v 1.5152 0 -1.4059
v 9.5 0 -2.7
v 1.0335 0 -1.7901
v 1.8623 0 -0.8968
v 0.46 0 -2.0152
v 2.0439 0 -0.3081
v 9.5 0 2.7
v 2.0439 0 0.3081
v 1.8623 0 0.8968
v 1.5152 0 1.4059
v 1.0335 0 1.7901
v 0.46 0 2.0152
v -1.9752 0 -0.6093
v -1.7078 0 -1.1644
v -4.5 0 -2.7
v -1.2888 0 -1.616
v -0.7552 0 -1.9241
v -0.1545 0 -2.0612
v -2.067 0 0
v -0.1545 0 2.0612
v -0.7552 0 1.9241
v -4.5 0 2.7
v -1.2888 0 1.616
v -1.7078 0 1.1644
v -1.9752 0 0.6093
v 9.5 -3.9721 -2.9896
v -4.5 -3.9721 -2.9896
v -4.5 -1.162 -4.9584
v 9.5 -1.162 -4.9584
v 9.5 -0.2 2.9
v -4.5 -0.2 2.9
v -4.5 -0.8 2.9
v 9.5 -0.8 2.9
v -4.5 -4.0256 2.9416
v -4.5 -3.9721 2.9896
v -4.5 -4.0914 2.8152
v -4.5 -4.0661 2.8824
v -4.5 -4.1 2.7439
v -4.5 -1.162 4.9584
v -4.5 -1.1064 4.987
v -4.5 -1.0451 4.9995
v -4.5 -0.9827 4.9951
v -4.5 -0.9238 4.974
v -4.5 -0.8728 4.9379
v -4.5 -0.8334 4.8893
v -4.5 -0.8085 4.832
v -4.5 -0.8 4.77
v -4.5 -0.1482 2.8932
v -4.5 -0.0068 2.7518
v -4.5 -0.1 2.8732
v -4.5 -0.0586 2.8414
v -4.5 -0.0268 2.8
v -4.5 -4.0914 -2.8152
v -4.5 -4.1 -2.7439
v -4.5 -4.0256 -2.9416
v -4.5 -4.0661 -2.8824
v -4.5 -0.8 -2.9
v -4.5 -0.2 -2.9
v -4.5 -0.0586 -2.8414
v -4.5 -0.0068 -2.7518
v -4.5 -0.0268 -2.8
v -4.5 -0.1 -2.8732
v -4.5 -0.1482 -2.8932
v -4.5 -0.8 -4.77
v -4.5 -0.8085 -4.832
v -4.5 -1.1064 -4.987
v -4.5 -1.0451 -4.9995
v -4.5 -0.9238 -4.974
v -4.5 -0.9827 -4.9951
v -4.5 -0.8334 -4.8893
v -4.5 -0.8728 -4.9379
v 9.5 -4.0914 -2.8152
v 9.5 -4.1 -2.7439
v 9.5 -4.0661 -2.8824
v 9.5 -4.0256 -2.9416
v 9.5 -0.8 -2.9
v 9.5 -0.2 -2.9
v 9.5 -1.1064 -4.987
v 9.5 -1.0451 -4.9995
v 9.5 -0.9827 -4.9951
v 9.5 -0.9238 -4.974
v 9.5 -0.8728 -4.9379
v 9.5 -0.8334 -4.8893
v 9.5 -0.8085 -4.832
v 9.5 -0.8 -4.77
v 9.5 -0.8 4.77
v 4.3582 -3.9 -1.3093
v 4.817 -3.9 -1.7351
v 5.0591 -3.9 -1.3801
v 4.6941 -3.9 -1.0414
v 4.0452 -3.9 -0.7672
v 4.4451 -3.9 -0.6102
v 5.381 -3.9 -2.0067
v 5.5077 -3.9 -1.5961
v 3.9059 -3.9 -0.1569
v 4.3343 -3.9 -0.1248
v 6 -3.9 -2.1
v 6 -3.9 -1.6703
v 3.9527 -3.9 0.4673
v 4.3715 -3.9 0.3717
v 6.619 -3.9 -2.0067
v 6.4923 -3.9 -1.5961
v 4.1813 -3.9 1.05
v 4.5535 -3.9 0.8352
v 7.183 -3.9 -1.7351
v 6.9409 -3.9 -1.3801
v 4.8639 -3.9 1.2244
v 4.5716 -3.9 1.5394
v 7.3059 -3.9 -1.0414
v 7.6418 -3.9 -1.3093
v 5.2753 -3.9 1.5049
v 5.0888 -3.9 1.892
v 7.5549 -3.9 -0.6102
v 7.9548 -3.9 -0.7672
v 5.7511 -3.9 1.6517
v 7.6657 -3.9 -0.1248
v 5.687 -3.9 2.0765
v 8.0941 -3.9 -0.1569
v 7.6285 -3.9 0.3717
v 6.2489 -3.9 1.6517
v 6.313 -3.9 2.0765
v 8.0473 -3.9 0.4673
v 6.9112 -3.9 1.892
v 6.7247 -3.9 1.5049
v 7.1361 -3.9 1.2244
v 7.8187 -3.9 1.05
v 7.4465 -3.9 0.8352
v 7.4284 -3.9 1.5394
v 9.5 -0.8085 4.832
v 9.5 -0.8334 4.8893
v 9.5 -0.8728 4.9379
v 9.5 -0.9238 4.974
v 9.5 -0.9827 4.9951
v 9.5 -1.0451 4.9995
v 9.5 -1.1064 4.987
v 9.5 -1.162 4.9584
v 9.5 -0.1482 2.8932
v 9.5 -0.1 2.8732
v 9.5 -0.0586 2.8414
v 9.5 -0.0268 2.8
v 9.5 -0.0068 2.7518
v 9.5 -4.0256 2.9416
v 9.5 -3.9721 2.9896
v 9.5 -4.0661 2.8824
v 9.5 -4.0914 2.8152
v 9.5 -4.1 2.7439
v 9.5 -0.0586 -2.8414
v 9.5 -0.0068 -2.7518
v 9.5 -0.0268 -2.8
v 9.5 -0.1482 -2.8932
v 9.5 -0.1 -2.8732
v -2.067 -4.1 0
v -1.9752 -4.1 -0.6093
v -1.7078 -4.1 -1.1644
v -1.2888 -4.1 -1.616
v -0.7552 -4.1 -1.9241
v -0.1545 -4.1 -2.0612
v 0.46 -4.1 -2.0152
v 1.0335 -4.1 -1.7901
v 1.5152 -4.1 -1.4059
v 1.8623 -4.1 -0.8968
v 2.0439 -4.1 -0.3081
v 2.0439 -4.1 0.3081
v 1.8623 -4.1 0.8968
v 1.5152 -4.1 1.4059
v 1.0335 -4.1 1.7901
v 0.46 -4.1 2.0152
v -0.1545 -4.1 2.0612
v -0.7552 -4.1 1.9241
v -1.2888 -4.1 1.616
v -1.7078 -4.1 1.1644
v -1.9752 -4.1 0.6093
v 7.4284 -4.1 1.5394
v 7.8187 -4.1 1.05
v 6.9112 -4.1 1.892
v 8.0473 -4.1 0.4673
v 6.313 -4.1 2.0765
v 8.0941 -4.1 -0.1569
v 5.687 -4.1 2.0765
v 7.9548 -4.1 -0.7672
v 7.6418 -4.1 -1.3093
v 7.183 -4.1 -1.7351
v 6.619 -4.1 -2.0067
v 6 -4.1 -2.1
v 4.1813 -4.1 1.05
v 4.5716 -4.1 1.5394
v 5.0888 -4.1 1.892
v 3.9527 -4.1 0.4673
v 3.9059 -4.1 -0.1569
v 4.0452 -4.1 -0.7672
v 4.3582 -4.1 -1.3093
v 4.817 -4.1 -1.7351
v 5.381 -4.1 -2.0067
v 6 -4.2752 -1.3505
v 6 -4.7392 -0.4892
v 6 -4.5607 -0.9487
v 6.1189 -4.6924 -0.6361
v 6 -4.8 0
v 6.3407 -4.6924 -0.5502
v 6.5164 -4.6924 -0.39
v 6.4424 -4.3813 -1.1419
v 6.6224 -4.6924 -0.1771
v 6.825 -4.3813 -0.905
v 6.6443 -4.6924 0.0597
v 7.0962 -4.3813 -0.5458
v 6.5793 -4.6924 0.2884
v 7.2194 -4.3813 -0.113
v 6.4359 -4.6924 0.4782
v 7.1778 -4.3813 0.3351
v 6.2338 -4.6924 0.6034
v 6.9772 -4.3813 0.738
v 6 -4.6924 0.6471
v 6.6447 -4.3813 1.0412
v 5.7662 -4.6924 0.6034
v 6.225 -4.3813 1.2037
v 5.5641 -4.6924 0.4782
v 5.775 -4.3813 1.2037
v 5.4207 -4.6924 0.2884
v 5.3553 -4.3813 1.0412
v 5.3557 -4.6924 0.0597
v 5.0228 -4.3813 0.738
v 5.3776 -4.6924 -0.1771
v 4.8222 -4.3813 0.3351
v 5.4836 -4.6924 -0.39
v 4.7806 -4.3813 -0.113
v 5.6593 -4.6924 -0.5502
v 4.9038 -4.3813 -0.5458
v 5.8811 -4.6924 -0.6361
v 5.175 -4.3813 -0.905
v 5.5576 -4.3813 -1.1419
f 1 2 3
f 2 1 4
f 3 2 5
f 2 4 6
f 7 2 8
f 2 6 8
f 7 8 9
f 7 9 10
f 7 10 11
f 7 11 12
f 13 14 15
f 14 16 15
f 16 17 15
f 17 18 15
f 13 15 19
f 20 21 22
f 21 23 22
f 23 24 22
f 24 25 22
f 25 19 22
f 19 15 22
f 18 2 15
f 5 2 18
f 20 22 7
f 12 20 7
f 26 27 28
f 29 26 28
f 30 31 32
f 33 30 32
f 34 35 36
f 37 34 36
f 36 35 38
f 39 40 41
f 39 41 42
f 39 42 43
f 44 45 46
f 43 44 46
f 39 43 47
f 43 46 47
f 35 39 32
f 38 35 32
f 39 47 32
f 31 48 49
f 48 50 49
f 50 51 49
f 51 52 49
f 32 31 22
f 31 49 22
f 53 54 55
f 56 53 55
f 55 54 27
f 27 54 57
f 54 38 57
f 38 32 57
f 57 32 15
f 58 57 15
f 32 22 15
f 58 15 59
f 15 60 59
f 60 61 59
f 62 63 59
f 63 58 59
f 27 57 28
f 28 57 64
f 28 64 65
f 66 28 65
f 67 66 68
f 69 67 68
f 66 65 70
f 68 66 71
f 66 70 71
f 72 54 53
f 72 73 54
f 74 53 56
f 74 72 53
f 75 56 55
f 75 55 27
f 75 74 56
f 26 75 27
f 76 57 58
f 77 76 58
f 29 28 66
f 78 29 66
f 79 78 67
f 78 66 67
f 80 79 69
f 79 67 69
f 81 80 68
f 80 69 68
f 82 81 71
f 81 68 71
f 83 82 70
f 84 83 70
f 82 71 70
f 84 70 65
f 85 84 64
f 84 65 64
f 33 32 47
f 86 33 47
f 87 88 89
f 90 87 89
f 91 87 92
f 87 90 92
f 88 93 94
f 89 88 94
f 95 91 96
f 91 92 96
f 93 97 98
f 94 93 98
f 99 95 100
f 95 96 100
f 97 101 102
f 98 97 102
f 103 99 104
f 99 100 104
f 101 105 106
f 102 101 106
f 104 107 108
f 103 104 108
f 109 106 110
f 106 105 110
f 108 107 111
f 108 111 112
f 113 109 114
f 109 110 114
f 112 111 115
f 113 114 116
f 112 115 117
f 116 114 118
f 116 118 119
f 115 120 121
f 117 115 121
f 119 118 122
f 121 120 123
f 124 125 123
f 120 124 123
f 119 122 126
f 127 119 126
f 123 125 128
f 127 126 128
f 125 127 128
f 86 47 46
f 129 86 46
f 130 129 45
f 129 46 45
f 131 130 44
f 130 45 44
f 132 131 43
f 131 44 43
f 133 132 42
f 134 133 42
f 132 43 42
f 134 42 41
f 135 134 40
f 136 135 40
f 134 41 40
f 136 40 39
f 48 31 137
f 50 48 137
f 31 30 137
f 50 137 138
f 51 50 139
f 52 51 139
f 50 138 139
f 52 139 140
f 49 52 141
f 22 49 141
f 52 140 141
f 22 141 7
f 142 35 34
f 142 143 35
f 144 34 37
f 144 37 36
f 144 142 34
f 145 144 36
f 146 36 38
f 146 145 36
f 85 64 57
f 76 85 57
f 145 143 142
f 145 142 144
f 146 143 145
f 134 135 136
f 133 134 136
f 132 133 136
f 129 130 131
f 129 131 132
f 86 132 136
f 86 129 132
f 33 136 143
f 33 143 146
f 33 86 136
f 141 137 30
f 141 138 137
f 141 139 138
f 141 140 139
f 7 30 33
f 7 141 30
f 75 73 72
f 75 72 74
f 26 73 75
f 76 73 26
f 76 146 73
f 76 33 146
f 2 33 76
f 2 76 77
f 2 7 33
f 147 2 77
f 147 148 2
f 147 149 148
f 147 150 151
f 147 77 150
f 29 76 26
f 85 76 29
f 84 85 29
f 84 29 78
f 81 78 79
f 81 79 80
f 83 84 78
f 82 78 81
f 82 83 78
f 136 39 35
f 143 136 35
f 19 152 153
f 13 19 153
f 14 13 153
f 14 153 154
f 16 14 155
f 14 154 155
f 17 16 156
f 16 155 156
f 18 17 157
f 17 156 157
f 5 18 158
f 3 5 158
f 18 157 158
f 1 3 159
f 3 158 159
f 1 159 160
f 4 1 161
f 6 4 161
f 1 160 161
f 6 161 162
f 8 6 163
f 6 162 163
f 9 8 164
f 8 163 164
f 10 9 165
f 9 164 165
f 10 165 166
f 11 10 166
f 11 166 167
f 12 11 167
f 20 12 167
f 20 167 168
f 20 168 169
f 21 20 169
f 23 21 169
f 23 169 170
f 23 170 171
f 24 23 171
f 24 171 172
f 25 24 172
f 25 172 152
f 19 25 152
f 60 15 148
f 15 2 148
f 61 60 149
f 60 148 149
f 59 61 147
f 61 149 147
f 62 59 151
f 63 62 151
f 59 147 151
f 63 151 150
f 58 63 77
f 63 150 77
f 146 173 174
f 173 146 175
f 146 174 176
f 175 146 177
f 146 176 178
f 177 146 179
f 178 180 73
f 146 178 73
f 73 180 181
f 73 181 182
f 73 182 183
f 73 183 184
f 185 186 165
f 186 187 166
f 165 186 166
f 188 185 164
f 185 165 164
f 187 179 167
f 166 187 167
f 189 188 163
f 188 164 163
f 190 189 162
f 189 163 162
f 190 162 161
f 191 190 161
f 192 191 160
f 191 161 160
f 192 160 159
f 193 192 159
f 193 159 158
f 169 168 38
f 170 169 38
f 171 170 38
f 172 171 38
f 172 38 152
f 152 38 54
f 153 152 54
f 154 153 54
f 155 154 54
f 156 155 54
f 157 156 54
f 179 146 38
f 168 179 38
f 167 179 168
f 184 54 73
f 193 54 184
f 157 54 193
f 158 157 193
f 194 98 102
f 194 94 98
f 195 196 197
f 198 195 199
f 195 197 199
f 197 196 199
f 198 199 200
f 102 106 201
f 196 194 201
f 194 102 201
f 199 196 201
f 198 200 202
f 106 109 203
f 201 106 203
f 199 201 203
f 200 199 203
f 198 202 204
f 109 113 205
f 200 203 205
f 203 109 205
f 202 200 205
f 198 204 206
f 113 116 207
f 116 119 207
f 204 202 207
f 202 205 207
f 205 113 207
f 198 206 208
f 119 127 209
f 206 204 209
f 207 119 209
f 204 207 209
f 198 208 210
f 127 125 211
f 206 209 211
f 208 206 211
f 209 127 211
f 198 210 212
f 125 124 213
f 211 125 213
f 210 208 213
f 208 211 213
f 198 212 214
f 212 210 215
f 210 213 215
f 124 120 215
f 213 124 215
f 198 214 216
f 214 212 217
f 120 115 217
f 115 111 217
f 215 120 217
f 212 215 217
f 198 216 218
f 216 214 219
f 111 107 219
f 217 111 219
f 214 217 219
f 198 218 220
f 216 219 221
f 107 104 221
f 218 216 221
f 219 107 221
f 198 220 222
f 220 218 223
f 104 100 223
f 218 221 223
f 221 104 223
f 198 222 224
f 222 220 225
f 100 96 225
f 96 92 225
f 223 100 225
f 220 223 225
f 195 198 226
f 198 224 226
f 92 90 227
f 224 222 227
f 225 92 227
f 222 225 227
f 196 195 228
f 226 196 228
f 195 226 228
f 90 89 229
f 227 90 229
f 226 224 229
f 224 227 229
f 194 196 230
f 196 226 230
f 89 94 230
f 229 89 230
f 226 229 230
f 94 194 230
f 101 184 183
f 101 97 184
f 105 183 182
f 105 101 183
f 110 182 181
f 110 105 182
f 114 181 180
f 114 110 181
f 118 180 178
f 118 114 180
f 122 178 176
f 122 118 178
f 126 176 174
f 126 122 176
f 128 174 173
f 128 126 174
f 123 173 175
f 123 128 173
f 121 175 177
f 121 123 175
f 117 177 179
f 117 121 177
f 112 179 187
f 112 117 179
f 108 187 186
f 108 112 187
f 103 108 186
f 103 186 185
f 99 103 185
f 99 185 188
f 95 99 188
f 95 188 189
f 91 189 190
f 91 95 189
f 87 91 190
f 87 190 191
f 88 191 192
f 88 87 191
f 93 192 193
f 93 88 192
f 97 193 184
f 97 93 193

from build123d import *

# Parameters (mm, degrees)
BOSS_EXTRUDE1_DEPTH = 14
FILLET1_R           = 0.3
FILLET2_R           = 0.2
SKETCH2_W           = 2.1
SKETCH2_H           = 0.2
TAPPED_HOLE1_D      = 4.134


with BuildPart() as part:
    # Sketch1 → Boss-Extrude1 (new body)
    with BuildSketch(Plane(origin=(-4.5, 0, 0), x_dir=(0, 0, -1), z_dir=(1, 0, 0))):
        with BuildLine():
            Line((2.9, 0), (-2.9, 0))
            Line((-2.9, 0), (-2.9, -0.8))
            Line((-2.9, -0.8), (-4.77, -0.8))
            ThreePointArc((-4.77, -0.8), (-4.974026325, -0.923824397), (-4.958370592, -1.161971664))
            Line((-4.958370592, -1.161971664), (-2.9, -4.1))
            Line((-2.9, -4.1), (2.9, -4.1))
            Line((2.9, -4.1), (4.958370592, -1.161971664))
            ThreePointArc((4.958370592, -1.161971664), (4.974026325, -0.923824397), (4.77, -0.8))
            Line((4.77, -0.8), (2.9, -0.8))
            Line((2.9, -0.8), (2.9, 0))
        make_face()
    extrude(amount=BOSS_EXTRUDE1_DEPTH)

    # Fillet1
    fillet1_edges = [part.edges().sort_by_distance(p)[0] for p in [
        (2.5, -4.1, -2.9),
        (2.5, -4.1, 2.9),
    ]]
    fillet(fillet1_edges, radius=FILLET1_R)

    # Fillet2
    fillet2_edges = [part.edges().sort_by_distance(p)[0] for p in [
        (2.5, 0, 2.9),
        (2.5, 0, -2.9),
    ]]
    fillet(fillet2_edges, radius=FILLET2_R)

    # Sketch2 → Cut-Revolve1 (revolve, cut)
    with BuildSketch(Plane(origin=(6, 0, 0), x_dir=(0, 0, -1), z_dir=(1, 0, 0))):
        with Locations((1.05, -4)):
            Rectangle(SKETCH2_W, SKETCH2_H)
    revolve(axis=Axis((6, 1.665548573, 0), (0, -1, 0)), mode=Mode.SUBTRACT)

    # Sketch3 → Revolve1 (revolve)
    with BuildSketch(Plane(origin=(6, 0, 0), x_dir=(0, 0, -1), z_dir=(1, 0, 0))):
        with BuildLine():
            Line((1.670329309, -3.9), (0, -3.9))
            Line((0, -3.9), (0, -4.8))
            ThreePointArc((0, -4.8), (0.948683298, -4.560681686), (1.670329309, -3.9))
        make_face()
    revolve(axis=Axis((6, 0, 0), (0, -1, 0)))

    # Tapped Hole1 (through all)
    with Locations(Plane(origin=(0, 0, 0), x_dir=(1, 0, 0), z_dir=(0, 1, 0))):
        with Locations((0, 0)):
            Hole(TAPPED_HOLE1_D / 2)


solid = part.part
